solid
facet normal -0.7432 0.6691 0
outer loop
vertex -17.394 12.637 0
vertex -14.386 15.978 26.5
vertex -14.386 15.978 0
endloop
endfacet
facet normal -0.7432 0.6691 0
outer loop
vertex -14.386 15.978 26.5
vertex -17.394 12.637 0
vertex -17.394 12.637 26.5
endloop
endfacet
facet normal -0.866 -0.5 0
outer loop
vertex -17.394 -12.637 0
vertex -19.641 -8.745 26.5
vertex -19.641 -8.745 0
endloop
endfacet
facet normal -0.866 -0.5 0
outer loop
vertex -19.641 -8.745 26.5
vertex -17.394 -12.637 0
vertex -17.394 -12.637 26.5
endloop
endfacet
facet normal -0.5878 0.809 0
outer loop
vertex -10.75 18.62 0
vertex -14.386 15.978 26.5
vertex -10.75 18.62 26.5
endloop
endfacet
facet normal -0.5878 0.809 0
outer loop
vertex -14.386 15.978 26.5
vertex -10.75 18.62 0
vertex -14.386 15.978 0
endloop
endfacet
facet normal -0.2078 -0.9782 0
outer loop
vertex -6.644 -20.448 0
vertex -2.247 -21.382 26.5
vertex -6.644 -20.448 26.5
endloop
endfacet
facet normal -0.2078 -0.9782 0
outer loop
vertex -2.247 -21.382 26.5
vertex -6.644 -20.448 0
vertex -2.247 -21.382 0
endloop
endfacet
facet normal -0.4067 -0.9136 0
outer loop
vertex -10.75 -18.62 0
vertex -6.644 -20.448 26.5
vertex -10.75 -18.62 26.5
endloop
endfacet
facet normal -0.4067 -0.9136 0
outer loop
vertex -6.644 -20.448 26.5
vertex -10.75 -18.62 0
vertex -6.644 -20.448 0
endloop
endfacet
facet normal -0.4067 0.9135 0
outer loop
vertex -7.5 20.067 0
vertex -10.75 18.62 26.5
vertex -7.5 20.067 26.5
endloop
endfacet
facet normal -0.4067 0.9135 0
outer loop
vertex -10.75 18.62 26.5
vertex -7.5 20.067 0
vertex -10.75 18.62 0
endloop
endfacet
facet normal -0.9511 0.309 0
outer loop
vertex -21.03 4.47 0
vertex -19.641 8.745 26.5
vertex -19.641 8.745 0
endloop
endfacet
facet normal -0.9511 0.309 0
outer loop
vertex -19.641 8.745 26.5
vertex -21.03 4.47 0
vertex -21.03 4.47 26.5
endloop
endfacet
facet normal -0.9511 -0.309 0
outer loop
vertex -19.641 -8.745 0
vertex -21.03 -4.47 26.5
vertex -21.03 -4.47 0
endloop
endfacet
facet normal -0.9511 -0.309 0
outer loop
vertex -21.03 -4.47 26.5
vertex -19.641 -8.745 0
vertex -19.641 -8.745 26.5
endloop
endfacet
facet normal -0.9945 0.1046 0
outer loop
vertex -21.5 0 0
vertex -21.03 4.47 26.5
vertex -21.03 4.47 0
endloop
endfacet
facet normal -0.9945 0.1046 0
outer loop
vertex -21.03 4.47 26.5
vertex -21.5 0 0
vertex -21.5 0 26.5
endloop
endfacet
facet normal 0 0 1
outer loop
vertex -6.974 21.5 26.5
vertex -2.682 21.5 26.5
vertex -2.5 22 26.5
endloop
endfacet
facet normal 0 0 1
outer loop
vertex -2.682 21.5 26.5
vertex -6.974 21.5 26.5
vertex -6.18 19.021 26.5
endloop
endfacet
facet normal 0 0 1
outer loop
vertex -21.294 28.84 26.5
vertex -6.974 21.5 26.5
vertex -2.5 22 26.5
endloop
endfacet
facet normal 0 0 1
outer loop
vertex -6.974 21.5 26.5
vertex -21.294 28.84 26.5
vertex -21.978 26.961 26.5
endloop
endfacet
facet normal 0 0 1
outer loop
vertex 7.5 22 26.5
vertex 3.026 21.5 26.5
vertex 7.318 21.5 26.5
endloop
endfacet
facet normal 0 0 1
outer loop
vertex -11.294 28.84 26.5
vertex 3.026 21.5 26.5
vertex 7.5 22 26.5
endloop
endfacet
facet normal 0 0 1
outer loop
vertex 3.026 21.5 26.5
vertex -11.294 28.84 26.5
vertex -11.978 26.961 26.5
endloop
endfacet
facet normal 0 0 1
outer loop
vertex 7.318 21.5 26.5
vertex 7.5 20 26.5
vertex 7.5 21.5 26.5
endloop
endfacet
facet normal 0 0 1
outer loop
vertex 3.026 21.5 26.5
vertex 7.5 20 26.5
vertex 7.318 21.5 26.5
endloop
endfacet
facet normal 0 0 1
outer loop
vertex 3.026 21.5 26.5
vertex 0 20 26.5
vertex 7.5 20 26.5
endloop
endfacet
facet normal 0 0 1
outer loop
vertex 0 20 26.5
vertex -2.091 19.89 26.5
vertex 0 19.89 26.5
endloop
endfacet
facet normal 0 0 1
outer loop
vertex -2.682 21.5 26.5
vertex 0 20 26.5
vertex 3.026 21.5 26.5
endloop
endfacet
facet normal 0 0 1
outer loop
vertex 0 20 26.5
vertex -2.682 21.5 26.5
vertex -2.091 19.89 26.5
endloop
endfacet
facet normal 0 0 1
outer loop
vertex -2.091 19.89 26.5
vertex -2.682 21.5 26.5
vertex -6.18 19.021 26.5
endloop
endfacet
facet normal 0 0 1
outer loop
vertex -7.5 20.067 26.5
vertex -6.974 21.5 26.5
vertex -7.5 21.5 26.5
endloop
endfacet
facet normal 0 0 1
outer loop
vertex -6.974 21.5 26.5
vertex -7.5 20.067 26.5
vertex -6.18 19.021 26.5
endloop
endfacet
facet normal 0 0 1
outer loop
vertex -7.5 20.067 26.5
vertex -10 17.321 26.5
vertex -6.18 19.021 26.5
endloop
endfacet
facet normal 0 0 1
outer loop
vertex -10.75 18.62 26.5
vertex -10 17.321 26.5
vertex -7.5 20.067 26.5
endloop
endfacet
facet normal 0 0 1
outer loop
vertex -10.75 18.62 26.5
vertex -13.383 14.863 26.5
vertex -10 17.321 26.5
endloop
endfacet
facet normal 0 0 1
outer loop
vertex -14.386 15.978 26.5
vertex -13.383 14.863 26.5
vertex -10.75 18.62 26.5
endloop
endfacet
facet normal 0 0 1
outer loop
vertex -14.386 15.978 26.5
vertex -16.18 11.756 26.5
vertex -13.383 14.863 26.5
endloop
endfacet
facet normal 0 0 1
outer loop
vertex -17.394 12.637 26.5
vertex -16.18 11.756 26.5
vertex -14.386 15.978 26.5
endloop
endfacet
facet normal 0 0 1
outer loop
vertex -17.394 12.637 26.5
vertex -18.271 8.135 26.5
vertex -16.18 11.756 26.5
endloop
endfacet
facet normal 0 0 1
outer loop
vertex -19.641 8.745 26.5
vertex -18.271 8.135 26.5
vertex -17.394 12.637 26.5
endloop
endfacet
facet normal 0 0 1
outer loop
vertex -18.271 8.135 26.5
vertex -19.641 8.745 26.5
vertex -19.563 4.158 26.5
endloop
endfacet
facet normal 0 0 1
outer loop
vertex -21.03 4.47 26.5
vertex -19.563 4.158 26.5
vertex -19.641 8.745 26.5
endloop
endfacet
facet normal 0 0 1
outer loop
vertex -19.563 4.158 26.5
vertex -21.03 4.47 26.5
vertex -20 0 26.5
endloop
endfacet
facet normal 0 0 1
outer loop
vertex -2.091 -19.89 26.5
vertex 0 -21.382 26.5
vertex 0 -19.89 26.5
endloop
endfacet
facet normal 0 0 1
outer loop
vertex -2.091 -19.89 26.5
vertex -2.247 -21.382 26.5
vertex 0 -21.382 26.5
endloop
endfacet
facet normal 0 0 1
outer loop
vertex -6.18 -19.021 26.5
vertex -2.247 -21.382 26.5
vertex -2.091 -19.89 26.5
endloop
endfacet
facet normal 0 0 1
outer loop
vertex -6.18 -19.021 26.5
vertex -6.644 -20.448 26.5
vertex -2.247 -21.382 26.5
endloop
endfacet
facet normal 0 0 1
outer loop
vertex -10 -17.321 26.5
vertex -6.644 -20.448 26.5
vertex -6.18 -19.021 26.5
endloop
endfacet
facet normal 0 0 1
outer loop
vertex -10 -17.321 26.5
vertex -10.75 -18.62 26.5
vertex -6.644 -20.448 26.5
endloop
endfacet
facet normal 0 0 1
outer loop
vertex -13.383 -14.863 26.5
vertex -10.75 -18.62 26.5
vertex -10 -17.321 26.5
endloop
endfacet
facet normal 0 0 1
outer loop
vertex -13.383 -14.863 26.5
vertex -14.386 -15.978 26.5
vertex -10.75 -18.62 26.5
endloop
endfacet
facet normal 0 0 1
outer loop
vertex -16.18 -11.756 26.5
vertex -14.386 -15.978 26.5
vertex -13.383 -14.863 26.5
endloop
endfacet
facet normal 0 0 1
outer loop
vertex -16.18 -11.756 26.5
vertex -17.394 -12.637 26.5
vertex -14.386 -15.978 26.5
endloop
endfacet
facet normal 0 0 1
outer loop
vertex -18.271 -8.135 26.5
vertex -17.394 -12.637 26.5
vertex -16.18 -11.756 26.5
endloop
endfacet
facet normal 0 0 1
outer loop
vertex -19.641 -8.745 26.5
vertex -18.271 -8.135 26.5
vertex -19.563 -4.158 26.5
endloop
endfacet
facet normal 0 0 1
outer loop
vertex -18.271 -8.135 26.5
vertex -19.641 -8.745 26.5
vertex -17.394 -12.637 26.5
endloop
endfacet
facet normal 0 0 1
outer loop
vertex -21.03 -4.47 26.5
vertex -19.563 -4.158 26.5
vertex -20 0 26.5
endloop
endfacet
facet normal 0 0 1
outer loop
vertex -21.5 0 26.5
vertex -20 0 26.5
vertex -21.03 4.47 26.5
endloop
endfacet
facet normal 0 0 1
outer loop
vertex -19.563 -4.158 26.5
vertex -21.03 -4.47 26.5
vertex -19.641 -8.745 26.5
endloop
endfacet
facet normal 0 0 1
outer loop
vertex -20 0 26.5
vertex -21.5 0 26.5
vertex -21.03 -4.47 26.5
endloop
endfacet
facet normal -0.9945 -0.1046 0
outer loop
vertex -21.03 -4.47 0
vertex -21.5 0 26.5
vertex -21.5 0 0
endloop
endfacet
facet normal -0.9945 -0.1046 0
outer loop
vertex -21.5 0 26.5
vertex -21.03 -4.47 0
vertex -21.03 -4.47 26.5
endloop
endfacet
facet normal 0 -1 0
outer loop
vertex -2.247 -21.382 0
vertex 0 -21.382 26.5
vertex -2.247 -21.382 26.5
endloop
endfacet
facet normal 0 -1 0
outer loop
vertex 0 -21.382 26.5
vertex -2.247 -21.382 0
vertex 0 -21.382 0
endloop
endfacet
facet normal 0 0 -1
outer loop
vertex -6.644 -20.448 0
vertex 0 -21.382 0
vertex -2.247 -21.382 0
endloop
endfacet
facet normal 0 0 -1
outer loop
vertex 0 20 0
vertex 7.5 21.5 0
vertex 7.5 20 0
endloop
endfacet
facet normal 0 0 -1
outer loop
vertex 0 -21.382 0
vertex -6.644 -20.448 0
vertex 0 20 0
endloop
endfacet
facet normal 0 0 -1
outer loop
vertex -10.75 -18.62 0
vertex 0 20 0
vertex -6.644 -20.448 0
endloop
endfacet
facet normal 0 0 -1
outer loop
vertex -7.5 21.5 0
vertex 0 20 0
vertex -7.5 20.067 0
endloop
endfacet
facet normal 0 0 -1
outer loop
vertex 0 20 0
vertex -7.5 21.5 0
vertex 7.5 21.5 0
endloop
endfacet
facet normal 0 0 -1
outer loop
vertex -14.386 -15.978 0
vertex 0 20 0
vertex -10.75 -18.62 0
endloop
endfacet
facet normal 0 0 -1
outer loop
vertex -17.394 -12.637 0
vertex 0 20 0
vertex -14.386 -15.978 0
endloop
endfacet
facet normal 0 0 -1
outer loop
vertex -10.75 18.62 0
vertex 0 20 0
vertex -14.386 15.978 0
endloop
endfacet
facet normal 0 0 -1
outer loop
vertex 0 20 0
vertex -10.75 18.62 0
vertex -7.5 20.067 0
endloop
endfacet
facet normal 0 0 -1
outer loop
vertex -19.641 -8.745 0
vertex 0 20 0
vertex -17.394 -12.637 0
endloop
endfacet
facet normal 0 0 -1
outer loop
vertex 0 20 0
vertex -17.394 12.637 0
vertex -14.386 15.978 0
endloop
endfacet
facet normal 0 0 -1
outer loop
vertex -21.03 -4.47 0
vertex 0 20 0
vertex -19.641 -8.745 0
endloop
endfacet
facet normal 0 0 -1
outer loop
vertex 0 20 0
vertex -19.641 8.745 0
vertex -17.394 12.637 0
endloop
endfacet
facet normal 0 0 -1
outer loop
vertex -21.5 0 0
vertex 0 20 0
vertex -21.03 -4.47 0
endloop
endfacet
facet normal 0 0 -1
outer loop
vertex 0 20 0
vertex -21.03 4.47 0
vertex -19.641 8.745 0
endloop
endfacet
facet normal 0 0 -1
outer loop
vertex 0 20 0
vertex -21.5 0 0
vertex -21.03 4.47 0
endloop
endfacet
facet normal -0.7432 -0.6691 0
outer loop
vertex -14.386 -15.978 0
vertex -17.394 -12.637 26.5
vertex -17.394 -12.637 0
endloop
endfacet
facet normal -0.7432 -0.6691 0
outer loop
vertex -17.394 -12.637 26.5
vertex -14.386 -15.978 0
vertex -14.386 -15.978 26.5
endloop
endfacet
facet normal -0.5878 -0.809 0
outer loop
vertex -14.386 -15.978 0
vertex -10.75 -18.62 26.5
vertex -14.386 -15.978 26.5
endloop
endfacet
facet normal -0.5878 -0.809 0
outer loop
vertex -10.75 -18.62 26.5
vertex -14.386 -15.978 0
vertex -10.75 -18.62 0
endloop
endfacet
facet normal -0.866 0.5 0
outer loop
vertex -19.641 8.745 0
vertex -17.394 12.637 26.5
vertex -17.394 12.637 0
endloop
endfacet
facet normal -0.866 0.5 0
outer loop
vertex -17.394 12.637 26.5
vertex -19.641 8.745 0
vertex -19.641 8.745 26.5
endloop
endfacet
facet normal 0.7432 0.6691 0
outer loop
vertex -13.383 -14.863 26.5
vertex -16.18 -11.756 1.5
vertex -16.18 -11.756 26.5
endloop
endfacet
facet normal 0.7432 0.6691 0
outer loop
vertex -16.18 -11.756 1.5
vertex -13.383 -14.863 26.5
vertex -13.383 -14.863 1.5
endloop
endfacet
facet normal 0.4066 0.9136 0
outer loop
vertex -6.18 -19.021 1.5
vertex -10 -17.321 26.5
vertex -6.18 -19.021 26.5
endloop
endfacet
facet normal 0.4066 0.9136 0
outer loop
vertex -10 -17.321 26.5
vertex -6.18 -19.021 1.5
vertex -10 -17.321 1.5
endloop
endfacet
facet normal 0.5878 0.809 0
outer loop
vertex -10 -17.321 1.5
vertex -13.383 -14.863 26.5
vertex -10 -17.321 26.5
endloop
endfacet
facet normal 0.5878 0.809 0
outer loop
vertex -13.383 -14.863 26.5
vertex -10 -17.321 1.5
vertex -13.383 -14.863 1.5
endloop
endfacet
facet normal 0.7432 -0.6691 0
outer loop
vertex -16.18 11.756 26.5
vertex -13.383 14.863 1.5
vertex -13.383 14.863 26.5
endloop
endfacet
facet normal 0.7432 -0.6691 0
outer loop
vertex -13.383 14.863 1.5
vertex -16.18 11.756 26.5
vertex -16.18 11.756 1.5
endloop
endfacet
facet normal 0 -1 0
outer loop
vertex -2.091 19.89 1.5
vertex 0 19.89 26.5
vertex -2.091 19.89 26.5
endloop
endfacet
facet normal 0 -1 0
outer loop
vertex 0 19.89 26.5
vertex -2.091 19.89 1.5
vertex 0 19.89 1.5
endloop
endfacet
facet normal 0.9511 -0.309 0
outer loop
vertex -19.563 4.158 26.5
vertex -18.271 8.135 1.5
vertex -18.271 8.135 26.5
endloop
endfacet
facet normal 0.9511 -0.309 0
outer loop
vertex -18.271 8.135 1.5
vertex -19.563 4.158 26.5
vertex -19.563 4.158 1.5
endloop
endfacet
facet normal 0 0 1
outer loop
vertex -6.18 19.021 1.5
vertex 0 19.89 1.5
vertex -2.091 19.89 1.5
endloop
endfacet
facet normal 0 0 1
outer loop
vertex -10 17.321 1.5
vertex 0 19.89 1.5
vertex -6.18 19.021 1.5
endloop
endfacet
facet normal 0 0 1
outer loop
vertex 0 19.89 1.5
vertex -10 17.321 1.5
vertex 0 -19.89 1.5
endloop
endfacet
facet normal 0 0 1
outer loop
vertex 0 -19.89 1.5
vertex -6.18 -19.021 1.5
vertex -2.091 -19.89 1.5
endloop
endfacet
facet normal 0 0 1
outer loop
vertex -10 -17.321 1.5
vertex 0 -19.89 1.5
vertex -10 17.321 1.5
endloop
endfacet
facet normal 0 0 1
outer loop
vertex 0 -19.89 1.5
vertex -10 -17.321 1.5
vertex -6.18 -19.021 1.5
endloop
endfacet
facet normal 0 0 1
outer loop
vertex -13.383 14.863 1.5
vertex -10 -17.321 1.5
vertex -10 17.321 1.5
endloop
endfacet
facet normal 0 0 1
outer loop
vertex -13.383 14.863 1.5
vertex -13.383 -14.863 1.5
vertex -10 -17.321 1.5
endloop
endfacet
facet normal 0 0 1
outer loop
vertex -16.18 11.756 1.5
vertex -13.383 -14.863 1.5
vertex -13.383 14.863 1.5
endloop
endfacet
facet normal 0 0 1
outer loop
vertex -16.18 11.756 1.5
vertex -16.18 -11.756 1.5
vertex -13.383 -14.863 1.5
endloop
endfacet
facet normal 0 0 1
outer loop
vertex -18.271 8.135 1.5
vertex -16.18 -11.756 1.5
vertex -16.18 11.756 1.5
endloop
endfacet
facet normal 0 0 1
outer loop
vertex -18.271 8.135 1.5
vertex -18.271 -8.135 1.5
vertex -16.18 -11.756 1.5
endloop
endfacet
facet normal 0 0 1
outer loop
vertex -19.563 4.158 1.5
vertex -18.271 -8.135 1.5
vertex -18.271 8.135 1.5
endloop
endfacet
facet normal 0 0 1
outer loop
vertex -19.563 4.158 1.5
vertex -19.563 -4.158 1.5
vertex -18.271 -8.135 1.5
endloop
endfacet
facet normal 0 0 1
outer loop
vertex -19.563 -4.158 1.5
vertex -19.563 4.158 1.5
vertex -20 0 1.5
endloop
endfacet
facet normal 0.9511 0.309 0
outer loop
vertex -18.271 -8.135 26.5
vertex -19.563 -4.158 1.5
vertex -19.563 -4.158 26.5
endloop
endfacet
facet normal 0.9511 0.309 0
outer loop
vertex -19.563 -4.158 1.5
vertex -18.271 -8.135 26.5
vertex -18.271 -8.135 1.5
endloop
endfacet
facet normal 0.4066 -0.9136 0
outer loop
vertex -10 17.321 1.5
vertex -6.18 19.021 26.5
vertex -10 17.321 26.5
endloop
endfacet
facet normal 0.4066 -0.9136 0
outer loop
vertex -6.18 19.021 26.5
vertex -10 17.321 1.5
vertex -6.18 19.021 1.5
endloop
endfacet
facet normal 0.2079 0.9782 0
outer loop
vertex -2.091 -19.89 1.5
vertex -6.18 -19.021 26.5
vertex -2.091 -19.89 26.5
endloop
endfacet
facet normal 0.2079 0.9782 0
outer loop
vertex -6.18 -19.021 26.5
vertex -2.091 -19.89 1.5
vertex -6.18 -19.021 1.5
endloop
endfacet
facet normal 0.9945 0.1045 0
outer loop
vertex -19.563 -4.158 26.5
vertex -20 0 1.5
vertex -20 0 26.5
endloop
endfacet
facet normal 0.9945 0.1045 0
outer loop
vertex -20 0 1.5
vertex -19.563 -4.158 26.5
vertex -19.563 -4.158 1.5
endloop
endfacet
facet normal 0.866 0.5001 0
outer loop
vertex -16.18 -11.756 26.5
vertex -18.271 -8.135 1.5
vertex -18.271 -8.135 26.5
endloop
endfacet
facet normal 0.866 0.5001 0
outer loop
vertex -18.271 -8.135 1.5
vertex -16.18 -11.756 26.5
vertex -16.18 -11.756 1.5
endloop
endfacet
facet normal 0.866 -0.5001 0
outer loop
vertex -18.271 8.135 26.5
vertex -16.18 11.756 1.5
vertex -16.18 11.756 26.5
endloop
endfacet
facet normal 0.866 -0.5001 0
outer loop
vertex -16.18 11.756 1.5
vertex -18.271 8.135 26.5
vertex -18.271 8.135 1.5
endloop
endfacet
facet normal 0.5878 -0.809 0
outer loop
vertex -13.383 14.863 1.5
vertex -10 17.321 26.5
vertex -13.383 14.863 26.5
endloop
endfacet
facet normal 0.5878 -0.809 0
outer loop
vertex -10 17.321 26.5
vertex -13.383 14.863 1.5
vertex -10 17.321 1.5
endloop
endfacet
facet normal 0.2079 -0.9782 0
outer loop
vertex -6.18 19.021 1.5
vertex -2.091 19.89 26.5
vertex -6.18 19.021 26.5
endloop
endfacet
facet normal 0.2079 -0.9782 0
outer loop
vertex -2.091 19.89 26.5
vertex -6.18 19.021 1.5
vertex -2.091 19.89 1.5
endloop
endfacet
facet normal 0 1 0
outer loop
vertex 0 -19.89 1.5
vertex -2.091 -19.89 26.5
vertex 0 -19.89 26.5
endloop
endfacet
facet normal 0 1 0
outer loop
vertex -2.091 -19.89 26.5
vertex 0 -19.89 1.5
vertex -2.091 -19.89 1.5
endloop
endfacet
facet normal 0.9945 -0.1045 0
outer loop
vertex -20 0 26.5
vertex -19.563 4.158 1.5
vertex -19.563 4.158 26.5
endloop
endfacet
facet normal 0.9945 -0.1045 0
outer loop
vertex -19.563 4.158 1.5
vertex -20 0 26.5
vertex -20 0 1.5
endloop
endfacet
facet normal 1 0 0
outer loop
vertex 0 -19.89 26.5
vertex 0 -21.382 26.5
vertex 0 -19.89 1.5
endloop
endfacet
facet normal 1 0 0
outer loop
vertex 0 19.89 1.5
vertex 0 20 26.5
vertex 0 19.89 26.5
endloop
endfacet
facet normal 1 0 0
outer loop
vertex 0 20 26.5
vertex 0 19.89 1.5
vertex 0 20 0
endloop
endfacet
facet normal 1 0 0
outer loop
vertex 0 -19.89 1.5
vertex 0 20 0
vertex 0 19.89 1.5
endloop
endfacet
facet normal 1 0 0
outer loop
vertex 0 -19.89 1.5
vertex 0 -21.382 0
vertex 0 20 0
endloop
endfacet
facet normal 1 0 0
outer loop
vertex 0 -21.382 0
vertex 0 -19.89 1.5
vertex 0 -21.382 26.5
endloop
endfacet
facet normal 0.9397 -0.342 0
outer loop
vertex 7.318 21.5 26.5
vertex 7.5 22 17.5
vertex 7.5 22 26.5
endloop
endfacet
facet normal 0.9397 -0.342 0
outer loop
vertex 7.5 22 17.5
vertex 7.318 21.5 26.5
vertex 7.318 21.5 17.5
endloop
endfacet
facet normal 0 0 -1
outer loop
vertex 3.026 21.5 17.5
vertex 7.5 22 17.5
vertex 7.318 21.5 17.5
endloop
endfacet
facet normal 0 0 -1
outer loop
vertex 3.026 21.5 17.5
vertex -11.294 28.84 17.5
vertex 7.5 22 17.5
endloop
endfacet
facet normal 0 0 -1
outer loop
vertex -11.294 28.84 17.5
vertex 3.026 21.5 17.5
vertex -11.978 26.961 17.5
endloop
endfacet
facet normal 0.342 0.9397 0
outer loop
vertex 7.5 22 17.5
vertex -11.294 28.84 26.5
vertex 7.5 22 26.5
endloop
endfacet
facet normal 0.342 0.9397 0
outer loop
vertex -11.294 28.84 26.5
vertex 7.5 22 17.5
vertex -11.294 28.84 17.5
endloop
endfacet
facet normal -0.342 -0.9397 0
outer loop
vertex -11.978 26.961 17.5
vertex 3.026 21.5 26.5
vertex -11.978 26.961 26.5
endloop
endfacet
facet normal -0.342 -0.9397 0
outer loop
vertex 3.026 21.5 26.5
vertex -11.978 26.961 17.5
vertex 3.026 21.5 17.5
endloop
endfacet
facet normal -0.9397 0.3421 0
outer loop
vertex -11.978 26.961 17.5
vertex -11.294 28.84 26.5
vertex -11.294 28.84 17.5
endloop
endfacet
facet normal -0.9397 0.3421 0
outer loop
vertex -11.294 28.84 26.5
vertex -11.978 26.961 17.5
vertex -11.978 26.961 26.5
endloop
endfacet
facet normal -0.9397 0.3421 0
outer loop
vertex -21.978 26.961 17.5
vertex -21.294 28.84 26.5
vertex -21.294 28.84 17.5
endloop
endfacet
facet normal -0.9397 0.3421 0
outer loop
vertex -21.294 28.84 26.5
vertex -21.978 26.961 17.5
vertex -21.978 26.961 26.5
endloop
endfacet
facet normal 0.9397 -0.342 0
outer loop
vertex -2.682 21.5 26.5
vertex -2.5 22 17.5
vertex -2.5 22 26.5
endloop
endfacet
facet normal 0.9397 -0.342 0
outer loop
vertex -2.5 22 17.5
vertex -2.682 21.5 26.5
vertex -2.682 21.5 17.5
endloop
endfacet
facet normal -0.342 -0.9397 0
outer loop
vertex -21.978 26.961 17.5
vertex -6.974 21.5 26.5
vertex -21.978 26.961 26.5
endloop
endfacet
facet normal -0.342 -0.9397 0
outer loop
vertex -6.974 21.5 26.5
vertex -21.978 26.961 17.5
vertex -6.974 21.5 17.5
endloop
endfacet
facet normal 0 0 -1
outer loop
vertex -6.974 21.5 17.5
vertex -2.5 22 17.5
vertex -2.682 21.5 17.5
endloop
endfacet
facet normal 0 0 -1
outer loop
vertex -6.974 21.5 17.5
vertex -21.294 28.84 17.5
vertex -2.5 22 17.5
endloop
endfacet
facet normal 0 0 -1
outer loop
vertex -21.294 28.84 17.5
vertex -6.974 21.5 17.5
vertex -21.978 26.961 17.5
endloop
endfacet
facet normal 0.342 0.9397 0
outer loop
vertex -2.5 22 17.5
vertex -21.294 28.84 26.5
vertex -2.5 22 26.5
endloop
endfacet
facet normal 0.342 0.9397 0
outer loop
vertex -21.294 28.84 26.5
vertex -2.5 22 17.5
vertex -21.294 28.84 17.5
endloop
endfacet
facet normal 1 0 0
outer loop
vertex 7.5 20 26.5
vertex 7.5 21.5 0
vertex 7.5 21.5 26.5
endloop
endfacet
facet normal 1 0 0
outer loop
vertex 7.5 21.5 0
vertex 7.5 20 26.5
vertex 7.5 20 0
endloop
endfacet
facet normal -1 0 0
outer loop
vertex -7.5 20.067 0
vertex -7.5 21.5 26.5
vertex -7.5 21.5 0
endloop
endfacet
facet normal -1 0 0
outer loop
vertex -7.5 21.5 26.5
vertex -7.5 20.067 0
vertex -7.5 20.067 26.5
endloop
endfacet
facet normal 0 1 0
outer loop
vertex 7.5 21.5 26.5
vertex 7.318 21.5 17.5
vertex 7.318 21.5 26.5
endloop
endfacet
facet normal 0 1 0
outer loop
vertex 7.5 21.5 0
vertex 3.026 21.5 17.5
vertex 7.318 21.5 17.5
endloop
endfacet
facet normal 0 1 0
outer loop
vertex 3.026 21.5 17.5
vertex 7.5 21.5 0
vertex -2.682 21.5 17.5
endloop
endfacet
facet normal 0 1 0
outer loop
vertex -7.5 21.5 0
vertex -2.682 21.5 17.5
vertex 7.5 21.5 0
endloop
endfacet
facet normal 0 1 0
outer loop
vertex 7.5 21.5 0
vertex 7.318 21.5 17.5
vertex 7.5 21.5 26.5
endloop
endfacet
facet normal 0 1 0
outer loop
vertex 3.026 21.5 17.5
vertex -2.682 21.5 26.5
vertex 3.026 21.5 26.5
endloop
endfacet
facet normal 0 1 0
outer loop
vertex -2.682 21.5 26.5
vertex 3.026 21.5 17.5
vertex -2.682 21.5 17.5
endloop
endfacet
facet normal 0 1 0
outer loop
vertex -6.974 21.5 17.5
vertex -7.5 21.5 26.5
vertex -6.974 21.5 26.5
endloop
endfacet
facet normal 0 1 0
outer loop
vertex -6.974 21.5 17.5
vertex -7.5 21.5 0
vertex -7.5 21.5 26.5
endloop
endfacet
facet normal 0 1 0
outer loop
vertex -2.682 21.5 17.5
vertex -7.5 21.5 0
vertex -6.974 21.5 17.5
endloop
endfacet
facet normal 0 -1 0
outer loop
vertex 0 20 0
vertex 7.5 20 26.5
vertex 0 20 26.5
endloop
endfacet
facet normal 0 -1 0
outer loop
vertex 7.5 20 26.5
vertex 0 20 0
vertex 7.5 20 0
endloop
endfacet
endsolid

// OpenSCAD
use <MCAD/regular_shapes.scad>

t = 1.5;
r = 20;
w = 25;

straw_l = 210;
grating_l = 175;
pin_z = (straw_l - grating_l) / 2;
pin = [20, 2, w + t - pin_z];
backplate_x = 15;

intersection(){
    difference(){
        cylinder(w + t, r + t, r + t);
        translate([0, 0, t])
        cylinder(w, r, r);
    }
    translate([-500, 0, 0])
    cube([1000, 1000, 1000], center=true);
}
translate([0, r + t/2, (w + t)/2])
cube([backplate_x, t, w + t], center=true);

for (x = [0, -10])
translate([backplate_x/2 + x, r + pin.y, pin_z])
rotate([0, 0, 160])
cube(pin);
